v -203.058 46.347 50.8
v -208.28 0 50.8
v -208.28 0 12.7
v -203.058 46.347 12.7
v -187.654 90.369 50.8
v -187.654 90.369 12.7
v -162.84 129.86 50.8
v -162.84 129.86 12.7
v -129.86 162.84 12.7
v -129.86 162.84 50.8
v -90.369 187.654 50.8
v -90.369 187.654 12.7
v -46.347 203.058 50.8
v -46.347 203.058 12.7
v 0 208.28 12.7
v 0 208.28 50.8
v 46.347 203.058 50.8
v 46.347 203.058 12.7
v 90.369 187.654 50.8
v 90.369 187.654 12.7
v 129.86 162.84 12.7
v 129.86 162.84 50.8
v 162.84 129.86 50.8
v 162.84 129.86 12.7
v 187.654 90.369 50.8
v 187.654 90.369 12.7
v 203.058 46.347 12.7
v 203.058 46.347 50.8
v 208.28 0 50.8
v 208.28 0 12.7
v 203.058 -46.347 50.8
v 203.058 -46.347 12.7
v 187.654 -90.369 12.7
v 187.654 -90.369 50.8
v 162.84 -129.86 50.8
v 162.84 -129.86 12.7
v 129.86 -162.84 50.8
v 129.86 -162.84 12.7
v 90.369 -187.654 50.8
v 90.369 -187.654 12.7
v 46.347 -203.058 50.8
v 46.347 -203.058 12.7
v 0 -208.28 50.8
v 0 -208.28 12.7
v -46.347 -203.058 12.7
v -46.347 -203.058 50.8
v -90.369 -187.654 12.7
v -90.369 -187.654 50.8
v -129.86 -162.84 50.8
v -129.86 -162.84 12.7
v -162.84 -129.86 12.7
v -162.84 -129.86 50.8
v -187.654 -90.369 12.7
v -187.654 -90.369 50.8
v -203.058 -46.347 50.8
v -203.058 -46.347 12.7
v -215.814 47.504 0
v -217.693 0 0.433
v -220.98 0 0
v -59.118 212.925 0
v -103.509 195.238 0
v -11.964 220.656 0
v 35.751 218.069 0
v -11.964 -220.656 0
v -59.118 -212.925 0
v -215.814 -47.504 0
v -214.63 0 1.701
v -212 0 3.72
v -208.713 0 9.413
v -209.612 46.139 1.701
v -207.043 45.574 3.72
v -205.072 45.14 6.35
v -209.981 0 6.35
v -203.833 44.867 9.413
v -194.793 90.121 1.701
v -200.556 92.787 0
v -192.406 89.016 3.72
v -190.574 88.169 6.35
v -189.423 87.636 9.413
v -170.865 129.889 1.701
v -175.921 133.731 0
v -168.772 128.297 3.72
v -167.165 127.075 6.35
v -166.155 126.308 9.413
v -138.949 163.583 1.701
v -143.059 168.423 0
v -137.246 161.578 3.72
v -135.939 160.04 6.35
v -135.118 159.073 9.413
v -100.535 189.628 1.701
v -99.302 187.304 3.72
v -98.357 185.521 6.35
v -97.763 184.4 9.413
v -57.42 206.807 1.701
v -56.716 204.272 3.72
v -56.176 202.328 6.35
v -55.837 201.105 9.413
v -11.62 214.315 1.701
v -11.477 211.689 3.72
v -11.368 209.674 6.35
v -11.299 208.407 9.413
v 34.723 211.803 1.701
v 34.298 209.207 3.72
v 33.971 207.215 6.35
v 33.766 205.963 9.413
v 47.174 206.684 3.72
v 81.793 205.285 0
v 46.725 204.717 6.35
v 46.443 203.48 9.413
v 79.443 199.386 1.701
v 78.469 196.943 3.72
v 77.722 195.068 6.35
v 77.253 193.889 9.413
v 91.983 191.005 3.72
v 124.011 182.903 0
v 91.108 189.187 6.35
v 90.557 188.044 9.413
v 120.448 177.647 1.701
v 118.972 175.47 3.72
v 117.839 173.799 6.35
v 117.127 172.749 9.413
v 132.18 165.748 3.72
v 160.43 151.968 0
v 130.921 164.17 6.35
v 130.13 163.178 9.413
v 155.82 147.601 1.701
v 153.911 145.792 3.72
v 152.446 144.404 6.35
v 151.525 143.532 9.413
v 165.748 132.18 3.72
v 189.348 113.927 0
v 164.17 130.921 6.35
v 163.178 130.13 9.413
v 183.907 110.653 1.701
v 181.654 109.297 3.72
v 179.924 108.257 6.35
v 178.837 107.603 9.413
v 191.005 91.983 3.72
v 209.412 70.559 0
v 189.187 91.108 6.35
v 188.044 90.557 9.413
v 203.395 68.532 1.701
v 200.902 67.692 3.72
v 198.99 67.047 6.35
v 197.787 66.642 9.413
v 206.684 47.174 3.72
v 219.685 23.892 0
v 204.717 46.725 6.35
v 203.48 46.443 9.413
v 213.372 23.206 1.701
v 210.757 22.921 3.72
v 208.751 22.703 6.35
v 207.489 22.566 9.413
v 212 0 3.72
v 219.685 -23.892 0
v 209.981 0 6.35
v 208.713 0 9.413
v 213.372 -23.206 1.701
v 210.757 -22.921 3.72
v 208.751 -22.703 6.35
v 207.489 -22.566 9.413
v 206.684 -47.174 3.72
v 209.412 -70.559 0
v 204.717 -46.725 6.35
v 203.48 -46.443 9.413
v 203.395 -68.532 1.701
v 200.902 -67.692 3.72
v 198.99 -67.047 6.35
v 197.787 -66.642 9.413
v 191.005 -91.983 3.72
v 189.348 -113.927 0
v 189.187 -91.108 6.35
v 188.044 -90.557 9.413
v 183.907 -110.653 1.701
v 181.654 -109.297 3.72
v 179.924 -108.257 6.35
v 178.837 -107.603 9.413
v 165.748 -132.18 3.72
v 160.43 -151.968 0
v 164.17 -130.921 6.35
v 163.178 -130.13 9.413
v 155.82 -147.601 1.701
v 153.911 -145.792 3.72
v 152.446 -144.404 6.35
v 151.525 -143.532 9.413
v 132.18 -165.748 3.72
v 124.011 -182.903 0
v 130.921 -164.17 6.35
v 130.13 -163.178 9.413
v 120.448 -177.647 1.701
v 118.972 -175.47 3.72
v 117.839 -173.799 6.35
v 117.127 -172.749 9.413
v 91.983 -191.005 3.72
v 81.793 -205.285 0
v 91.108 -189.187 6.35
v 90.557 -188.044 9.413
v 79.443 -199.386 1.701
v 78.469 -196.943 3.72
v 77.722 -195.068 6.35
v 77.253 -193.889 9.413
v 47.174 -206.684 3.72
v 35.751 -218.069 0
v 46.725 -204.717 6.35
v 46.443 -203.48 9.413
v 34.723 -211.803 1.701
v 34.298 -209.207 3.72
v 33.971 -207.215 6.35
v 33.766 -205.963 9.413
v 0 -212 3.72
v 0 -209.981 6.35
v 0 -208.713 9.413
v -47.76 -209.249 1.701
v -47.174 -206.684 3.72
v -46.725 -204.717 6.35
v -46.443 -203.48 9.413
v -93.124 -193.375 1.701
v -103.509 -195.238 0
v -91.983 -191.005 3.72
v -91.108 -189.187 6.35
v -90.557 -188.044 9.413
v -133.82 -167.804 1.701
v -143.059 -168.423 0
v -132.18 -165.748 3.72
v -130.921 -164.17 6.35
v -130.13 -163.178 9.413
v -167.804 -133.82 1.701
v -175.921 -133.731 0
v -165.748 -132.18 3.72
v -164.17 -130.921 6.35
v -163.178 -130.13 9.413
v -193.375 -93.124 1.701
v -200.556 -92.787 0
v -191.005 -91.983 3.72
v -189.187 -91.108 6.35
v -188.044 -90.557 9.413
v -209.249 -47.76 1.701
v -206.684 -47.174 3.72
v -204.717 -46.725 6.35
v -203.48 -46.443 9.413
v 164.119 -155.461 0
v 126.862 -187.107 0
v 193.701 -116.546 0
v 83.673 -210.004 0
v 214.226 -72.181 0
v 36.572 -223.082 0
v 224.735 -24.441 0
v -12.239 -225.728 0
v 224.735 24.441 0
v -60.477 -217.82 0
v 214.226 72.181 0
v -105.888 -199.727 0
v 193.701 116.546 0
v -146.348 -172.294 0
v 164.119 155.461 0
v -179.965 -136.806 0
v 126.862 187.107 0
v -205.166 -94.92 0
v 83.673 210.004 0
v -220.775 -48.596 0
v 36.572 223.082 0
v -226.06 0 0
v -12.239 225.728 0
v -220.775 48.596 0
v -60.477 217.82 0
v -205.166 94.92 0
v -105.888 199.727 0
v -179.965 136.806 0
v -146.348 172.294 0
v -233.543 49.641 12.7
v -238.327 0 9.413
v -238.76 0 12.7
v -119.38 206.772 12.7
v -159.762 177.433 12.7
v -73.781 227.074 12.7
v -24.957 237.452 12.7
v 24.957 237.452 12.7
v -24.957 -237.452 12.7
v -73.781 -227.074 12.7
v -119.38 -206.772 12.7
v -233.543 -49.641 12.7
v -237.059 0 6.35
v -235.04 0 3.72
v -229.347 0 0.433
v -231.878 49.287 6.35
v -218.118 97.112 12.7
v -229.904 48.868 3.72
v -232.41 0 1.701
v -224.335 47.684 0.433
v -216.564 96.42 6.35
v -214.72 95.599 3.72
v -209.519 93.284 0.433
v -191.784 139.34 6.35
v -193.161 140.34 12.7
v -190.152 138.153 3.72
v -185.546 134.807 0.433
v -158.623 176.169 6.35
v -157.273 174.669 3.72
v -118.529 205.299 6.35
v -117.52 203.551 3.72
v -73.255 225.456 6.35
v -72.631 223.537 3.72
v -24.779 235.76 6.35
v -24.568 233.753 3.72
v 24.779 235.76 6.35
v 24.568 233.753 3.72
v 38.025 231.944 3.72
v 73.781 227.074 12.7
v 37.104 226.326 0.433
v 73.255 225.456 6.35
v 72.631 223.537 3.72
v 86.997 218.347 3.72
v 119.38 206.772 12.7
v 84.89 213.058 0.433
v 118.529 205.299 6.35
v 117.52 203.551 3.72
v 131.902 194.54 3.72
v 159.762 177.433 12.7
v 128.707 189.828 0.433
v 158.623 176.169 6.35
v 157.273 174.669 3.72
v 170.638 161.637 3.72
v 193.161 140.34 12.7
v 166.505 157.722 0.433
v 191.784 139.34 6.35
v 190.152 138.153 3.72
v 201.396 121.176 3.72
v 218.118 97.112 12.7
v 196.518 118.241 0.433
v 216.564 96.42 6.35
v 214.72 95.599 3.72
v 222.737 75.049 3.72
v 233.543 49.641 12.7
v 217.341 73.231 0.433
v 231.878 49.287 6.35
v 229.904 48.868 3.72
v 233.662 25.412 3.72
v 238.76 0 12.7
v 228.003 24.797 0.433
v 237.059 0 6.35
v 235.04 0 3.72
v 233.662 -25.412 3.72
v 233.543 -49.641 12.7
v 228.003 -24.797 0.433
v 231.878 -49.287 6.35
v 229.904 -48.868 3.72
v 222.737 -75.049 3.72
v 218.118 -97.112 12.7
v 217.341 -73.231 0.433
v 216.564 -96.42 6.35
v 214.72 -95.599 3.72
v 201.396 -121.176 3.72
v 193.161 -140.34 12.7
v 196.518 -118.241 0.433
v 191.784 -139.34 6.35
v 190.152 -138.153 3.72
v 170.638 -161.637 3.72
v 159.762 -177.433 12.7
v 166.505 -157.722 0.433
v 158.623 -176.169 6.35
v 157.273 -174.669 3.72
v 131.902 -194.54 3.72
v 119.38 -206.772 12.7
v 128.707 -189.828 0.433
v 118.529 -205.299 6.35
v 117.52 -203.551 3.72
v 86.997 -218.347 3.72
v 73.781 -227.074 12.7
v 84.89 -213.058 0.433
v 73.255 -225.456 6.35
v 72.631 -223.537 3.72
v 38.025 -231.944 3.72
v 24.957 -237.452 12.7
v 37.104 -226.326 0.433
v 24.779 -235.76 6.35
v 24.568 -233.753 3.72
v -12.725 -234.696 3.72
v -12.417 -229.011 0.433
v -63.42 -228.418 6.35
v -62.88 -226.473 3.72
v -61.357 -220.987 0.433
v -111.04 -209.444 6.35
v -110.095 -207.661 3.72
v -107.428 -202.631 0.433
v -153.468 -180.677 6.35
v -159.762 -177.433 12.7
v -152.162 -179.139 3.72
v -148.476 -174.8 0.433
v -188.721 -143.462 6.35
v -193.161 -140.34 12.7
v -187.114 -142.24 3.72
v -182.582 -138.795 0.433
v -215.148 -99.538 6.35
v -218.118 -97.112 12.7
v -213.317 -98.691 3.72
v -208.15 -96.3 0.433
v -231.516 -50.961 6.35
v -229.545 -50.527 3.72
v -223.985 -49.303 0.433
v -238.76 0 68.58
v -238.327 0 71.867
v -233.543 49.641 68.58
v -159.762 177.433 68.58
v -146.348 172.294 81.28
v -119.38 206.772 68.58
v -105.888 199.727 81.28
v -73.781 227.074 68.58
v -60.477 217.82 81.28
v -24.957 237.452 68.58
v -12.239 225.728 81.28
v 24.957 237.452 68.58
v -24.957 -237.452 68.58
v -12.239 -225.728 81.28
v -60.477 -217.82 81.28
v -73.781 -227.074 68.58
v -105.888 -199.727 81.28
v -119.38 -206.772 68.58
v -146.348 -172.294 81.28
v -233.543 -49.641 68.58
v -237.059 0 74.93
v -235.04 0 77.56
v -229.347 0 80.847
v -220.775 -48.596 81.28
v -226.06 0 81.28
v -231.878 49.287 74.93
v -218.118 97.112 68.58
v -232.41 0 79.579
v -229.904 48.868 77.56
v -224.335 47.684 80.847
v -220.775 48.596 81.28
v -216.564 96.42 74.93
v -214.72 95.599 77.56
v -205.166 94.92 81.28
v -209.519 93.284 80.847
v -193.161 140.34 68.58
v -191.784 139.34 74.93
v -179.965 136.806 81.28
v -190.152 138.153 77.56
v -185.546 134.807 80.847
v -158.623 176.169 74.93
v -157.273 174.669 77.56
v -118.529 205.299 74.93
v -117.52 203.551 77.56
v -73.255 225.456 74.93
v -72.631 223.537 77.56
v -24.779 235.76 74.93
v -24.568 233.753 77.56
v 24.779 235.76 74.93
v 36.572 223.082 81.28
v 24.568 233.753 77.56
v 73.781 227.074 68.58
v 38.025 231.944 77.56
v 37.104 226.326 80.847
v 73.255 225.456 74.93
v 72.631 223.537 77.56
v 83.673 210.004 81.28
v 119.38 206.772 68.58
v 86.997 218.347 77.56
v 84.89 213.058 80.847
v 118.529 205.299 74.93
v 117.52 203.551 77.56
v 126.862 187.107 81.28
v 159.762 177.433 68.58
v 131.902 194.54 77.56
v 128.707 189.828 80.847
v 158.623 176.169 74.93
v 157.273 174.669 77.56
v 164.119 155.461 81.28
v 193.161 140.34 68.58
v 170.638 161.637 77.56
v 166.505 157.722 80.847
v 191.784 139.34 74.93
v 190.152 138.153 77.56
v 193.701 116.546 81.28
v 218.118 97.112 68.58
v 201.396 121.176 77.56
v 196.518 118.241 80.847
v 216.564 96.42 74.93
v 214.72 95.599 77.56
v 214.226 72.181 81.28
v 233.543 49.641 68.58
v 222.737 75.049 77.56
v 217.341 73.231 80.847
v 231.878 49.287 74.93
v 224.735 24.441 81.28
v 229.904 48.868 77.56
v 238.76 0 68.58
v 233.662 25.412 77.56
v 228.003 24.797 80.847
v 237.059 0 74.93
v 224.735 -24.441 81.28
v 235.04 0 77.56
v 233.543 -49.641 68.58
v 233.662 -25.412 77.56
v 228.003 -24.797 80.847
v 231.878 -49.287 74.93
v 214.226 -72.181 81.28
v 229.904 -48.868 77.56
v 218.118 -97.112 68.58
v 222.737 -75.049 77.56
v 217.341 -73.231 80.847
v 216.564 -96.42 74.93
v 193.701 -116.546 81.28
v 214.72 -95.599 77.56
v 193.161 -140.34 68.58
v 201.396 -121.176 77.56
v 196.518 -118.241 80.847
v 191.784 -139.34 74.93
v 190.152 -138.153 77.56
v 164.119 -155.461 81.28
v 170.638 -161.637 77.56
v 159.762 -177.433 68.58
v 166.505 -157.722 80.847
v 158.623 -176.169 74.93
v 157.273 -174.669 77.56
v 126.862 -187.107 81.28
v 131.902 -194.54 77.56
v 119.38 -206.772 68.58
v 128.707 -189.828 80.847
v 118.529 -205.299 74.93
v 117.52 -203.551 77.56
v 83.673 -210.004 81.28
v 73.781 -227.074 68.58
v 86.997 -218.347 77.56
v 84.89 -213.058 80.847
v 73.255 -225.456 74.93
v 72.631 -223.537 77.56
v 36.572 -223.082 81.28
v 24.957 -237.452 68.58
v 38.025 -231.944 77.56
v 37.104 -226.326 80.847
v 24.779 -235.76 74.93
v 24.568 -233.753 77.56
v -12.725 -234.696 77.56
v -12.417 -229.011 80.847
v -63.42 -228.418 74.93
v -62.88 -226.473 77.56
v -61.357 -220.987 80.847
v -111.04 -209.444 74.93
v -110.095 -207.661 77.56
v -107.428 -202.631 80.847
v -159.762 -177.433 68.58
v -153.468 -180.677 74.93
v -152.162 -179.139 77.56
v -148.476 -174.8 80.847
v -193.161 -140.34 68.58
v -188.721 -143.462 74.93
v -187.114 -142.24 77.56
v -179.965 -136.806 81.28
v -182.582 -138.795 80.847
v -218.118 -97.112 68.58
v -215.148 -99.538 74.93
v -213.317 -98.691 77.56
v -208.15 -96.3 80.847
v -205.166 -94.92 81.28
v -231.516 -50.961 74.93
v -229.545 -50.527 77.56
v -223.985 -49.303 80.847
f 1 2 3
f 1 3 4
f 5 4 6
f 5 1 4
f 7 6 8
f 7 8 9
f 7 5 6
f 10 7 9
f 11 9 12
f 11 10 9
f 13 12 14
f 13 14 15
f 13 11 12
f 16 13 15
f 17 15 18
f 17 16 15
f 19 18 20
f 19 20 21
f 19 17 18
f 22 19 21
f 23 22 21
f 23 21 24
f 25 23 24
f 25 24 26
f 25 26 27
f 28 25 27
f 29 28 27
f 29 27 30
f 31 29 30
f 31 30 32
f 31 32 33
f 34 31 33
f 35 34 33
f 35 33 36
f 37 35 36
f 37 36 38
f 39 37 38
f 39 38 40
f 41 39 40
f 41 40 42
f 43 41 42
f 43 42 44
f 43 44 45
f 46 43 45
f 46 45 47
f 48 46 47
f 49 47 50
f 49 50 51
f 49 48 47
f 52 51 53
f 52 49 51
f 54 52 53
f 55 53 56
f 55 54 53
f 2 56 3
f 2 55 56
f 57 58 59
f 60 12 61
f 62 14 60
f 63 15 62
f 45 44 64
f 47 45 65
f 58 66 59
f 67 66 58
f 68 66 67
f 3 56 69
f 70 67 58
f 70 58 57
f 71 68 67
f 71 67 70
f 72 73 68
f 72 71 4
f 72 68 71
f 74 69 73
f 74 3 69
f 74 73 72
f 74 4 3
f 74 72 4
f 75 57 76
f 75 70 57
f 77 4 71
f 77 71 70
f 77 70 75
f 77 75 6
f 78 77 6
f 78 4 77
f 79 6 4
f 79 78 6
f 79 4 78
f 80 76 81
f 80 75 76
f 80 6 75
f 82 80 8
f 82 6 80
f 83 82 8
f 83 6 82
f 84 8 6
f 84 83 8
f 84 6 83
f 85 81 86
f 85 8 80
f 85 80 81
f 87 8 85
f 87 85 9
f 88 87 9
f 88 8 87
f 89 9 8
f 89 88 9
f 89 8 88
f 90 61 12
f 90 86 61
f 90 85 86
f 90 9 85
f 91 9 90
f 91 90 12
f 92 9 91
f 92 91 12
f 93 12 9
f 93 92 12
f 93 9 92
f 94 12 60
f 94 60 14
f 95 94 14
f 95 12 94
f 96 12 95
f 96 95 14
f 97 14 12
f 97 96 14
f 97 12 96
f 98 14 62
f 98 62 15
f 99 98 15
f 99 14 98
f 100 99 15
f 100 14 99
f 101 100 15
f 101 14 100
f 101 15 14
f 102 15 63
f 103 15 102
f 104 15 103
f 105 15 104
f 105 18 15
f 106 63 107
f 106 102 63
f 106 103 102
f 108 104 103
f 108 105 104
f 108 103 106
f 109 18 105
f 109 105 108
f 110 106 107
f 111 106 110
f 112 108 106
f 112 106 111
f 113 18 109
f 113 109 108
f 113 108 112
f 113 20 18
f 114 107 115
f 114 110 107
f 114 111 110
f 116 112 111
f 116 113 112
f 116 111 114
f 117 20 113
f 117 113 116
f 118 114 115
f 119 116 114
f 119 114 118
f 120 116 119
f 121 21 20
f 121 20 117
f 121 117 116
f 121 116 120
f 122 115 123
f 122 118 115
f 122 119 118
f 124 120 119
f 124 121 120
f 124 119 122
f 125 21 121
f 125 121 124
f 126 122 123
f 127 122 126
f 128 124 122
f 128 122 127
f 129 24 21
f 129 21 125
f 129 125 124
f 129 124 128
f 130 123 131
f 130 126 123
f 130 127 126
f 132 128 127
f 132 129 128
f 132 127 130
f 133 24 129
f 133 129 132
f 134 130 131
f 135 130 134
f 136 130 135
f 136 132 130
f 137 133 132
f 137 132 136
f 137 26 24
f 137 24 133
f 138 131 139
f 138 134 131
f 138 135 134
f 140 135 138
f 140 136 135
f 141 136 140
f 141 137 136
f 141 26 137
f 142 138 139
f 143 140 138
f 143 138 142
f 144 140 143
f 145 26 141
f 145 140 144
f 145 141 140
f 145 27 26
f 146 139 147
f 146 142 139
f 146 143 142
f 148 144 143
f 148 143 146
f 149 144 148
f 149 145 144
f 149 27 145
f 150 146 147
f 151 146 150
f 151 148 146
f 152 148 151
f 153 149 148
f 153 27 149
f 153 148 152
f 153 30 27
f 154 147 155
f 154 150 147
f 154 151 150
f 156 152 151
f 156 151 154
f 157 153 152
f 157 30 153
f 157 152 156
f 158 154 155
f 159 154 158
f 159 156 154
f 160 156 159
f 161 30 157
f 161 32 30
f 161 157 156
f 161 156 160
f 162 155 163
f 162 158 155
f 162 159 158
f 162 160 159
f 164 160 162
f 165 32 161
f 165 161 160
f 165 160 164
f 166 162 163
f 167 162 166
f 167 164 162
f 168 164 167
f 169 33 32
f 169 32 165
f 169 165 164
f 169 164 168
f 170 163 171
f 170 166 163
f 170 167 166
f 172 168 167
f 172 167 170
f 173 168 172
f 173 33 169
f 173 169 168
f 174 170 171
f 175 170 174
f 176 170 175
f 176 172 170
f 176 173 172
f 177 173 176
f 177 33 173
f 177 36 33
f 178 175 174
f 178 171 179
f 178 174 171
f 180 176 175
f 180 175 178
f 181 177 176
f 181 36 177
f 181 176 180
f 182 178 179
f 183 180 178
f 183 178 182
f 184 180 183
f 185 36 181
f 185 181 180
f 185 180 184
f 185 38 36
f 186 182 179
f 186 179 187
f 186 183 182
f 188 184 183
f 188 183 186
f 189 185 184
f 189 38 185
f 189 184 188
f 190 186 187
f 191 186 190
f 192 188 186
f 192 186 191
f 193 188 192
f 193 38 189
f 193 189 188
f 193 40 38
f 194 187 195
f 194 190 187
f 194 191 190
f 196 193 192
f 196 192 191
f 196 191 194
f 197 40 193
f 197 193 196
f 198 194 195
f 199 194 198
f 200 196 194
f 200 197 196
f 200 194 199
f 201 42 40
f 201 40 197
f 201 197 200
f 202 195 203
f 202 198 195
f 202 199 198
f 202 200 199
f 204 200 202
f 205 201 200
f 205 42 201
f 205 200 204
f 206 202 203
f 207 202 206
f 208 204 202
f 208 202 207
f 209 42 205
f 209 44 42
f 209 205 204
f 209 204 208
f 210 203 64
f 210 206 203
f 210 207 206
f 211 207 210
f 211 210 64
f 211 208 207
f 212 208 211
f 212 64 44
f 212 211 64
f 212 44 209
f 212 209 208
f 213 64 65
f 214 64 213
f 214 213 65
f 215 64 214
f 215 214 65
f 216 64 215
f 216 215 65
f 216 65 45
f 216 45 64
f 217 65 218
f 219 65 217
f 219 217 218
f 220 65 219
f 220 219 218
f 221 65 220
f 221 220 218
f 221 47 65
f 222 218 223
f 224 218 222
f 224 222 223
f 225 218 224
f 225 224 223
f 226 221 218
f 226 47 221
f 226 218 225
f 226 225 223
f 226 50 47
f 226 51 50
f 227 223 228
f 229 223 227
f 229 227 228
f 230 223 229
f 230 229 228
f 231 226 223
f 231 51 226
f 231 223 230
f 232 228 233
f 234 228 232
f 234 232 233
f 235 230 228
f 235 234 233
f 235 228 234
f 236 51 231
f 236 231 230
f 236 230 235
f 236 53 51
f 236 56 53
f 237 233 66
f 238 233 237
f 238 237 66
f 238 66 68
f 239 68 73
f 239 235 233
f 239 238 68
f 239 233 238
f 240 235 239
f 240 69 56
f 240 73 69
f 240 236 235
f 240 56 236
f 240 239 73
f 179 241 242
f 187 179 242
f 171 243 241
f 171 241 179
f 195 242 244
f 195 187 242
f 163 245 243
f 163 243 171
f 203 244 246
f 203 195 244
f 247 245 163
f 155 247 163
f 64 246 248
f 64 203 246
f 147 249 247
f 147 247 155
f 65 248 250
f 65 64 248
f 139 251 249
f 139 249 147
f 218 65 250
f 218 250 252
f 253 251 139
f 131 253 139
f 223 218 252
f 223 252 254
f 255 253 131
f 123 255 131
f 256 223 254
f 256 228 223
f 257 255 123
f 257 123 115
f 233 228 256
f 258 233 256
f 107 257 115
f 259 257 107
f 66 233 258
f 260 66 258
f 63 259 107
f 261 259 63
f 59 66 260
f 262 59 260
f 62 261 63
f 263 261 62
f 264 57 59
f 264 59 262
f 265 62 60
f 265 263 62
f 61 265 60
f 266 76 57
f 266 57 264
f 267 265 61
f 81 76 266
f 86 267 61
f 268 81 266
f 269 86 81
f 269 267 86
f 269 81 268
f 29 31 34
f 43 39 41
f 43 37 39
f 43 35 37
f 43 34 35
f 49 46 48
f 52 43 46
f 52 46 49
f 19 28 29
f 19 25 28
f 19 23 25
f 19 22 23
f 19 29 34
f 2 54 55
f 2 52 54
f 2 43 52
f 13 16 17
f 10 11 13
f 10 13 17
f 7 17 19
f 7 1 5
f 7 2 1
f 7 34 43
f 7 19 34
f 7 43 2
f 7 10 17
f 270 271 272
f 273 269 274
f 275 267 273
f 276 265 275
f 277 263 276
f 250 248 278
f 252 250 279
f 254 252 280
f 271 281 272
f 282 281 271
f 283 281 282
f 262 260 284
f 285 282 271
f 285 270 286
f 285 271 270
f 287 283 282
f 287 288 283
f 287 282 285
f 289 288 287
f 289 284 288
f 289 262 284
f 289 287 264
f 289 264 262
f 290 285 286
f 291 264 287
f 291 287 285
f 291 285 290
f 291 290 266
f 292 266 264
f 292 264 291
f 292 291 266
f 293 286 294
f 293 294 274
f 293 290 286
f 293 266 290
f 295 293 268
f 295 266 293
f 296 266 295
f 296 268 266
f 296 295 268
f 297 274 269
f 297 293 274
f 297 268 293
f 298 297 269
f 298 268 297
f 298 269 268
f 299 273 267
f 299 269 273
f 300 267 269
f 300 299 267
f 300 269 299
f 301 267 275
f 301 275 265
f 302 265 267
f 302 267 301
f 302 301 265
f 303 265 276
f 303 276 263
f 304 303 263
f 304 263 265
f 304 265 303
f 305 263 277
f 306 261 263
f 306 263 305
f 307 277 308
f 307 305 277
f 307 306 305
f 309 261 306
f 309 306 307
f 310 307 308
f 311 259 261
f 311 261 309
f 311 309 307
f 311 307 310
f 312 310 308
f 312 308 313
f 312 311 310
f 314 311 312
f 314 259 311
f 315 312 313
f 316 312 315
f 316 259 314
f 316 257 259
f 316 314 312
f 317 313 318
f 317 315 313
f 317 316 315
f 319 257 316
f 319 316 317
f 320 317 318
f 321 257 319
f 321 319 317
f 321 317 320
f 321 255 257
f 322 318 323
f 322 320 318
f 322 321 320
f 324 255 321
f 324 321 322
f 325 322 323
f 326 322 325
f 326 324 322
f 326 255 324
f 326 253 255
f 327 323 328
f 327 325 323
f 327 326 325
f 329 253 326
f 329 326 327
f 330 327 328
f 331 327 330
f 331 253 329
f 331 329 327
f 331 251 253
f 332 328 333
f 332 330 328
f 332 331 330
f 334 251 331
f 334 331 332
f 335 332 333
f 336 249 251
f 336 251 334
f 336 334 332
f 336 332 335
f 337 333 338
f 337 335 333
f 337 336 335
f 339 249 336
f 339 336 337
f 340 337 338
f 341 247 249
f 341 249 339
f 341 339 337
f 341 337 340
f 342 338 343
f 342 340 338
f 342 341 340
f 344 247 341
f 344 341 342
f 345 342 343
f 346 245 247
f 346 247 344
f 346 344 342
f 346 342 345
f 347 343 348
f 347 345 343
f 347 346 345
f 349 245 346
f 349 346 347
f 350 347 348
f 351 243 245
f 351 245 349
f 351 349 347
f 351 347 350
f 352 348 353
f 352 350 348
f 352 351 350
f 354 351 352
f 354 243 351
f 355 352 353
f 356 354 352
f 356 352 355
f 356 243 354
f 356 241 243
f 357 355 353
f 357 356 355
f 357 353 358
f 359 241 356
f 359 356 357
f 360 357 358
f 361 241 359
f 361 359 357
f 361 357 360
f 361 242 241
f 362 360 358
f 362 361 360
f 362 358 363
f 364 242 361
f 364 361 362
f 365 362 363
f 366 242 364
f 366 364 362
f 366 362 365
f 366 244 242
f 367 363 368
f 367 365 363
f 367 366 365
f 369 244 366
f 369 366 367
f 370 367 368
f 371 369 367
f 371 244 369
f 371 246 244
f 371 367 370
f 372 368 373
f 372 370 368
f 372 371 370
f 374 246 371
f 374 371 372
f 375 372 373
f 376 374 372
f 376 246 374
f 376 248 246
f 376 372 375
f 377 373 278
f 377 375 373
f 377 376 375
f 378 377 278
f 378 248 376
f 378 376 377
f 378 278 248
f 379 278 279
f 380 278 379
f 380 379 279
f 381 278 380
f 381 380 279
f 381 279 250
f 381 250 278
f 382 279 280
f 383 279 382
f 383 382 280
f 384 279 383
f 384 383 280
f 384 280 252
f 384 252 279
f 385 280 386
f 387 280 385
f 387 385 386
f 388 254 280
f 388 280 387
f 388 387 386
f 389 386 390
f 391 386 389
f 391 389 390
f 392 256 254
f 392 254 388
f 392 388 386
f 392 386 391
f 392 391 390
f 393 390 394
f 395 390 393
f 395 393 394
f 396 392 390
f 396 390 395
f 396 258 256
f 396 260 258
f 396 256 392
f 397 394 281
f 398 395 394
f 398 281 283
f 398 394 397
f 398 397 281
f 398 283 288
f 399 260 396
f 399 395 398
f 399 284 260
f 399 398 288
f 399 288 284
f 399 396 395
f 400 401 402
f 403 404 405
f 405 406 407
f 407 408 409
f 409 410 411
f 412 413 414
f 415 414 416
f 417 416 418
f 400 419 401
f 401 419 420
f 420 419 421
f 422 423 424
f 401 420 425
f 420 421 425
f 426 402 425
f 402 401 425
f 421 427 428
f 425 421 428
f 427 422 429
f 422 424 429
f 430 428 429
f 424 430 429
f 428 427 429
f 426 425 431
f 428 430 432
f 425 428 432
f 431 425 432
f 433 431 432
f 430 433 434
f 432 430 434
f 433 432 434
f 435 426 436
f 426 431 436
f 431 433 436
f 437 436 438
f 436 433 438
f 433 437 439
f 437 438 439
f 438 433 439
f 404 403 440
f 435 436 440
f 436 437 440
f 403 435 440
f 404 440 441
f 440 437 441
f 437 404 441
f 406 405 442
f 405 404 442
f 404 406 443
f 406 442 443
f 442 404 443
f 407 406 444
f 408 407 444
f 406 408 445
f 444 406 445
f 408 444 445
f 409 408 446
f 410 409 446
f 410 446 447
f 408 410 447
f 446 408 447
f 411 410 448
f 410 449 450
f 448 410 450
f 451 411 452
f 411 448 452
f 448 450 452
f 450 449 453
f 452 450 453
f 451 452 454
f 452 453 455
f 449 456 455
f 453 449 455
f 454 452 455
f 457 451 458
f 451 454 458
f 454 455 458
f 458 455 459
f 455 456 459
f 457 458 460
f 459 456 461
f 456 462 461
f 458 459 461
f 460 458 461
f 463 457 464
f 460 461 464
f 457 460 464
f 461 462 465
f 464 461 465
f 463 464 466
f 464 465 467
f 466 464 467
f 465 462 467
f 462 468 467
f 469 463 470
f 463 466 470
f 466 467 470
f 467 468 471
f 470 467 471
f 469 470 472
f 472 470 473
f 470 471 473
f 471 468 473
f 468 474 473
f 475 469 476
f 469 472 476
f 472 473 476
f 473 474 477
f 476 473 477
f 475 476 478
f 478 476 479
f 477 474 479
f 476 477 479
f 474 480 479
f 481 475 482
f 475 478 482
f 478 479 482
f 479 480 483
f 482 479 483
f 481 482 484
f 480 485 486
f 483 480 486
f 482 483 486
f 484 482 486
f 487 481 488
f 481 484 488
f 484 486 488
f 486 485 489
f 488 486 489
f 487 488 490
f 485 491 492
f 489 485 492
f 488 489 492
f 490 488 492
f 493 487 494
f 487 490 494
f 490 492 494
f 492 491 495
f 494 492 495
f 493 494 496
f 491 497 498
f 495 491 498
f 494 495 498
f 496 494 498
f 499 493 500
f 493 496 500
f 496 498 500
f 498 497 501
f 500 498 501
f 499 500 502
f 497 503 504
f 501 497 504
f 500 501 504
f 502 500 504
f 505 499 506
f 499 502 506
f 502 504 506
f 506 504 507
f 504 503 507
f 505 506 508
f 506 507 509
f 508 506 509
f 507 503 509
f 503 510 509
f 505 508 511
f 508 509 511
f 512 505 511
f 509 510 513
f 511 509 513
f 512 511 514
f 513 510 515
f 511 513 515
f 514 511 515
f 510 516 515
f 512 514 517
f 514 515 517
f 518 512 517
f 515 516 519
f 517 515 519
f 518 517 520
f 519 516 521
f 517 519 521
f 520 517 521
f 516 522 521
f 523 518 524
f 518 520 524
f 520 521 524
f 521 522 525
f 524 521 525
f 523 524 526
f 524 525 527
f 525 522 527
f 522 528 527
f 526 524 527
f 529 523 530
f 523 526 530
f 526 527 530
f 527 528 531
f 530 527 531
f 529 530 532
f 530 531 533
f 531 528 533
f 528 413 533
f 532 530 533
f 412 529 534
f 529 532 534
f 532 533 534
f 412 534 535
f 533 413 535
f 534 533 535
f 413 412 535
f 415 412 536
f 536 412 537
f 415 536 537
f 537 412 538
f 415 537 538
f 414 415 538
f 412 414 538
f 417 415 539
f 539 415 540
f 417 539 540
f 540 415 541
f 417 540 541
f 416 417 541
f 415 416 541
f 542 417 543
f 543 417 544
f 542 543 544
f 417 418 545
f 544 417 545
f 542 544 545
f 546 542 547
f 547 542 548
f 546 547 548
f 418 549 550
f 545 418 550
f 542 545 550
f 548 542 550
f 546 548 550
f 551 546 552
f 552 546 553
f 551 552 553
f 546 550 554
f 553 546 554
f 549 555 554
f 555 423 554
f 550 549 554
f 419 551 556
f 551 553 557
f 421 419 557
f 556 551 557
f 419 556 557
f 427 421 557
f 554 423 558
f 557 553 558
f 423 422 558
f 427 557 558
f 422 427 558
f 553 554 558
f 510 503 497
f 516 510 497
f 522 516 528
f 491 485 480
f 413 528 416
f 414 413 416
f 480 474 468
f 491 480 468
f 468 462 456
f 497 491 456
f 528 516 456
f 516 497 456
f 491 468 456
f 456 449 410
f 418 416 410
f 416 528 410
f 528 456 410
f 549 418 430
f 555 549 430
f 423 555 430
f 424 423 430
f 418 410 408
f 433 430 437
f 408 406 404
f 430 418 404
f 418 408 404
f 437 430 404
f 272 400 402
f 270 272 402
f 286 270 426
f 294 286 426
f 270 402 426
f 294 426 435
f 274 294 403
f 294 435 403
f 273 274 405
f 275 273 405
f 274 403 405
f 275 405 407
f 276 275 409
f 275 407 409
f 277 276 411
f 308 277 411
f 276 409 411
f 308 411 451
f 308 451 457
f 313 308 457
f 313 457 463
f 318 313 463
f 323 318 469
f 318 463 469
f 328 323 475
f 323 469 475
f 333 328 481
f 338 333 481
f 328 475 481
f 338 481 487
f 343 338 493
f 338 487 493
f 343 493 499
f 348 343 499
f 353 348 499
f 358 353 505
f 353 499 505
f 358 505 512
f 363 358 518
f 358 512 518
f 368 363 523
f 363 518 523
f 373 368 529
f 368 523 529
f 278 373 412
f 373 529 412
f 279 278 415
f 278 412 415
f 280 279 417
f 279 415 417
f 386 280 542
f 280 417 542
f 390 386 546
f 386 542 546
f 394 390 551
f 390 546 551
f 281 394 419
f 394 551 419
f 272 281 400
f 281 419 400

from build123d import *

# Parameters (mm, degrees)
F0_W = 238.76
F0_H = 81.28
F2_T = -30.48
F3_R = 12.7


with BuildPart() as f1:
    # F0 (on Front) → F1 (revolve)
    with BuildSketch(Plane.XZ):
        with Locations((-119.38, 40.64)):
            Rectangle(F0_W, F0_H)
    revolve(axis=Axis((0, 0, 40.64), (0, 0, -1)))

    # F2
    f2_openings = [f1.faces().sort_by_distance(p)[0] for p in [
        (0, 0, 0),
    ]]
    offset(amount=F2_T, openings=f2_openings)

    # F3
    f3_edges = [f1.edges().sort_by_distance(p)[0] for p in [
        (238.76, 0, 81.28),
        (238.76, 0, 0),
        (208.28, 0, 0),
    ]]
    fillet(f3_edges, radius=F3_R)


solid = f1.part
